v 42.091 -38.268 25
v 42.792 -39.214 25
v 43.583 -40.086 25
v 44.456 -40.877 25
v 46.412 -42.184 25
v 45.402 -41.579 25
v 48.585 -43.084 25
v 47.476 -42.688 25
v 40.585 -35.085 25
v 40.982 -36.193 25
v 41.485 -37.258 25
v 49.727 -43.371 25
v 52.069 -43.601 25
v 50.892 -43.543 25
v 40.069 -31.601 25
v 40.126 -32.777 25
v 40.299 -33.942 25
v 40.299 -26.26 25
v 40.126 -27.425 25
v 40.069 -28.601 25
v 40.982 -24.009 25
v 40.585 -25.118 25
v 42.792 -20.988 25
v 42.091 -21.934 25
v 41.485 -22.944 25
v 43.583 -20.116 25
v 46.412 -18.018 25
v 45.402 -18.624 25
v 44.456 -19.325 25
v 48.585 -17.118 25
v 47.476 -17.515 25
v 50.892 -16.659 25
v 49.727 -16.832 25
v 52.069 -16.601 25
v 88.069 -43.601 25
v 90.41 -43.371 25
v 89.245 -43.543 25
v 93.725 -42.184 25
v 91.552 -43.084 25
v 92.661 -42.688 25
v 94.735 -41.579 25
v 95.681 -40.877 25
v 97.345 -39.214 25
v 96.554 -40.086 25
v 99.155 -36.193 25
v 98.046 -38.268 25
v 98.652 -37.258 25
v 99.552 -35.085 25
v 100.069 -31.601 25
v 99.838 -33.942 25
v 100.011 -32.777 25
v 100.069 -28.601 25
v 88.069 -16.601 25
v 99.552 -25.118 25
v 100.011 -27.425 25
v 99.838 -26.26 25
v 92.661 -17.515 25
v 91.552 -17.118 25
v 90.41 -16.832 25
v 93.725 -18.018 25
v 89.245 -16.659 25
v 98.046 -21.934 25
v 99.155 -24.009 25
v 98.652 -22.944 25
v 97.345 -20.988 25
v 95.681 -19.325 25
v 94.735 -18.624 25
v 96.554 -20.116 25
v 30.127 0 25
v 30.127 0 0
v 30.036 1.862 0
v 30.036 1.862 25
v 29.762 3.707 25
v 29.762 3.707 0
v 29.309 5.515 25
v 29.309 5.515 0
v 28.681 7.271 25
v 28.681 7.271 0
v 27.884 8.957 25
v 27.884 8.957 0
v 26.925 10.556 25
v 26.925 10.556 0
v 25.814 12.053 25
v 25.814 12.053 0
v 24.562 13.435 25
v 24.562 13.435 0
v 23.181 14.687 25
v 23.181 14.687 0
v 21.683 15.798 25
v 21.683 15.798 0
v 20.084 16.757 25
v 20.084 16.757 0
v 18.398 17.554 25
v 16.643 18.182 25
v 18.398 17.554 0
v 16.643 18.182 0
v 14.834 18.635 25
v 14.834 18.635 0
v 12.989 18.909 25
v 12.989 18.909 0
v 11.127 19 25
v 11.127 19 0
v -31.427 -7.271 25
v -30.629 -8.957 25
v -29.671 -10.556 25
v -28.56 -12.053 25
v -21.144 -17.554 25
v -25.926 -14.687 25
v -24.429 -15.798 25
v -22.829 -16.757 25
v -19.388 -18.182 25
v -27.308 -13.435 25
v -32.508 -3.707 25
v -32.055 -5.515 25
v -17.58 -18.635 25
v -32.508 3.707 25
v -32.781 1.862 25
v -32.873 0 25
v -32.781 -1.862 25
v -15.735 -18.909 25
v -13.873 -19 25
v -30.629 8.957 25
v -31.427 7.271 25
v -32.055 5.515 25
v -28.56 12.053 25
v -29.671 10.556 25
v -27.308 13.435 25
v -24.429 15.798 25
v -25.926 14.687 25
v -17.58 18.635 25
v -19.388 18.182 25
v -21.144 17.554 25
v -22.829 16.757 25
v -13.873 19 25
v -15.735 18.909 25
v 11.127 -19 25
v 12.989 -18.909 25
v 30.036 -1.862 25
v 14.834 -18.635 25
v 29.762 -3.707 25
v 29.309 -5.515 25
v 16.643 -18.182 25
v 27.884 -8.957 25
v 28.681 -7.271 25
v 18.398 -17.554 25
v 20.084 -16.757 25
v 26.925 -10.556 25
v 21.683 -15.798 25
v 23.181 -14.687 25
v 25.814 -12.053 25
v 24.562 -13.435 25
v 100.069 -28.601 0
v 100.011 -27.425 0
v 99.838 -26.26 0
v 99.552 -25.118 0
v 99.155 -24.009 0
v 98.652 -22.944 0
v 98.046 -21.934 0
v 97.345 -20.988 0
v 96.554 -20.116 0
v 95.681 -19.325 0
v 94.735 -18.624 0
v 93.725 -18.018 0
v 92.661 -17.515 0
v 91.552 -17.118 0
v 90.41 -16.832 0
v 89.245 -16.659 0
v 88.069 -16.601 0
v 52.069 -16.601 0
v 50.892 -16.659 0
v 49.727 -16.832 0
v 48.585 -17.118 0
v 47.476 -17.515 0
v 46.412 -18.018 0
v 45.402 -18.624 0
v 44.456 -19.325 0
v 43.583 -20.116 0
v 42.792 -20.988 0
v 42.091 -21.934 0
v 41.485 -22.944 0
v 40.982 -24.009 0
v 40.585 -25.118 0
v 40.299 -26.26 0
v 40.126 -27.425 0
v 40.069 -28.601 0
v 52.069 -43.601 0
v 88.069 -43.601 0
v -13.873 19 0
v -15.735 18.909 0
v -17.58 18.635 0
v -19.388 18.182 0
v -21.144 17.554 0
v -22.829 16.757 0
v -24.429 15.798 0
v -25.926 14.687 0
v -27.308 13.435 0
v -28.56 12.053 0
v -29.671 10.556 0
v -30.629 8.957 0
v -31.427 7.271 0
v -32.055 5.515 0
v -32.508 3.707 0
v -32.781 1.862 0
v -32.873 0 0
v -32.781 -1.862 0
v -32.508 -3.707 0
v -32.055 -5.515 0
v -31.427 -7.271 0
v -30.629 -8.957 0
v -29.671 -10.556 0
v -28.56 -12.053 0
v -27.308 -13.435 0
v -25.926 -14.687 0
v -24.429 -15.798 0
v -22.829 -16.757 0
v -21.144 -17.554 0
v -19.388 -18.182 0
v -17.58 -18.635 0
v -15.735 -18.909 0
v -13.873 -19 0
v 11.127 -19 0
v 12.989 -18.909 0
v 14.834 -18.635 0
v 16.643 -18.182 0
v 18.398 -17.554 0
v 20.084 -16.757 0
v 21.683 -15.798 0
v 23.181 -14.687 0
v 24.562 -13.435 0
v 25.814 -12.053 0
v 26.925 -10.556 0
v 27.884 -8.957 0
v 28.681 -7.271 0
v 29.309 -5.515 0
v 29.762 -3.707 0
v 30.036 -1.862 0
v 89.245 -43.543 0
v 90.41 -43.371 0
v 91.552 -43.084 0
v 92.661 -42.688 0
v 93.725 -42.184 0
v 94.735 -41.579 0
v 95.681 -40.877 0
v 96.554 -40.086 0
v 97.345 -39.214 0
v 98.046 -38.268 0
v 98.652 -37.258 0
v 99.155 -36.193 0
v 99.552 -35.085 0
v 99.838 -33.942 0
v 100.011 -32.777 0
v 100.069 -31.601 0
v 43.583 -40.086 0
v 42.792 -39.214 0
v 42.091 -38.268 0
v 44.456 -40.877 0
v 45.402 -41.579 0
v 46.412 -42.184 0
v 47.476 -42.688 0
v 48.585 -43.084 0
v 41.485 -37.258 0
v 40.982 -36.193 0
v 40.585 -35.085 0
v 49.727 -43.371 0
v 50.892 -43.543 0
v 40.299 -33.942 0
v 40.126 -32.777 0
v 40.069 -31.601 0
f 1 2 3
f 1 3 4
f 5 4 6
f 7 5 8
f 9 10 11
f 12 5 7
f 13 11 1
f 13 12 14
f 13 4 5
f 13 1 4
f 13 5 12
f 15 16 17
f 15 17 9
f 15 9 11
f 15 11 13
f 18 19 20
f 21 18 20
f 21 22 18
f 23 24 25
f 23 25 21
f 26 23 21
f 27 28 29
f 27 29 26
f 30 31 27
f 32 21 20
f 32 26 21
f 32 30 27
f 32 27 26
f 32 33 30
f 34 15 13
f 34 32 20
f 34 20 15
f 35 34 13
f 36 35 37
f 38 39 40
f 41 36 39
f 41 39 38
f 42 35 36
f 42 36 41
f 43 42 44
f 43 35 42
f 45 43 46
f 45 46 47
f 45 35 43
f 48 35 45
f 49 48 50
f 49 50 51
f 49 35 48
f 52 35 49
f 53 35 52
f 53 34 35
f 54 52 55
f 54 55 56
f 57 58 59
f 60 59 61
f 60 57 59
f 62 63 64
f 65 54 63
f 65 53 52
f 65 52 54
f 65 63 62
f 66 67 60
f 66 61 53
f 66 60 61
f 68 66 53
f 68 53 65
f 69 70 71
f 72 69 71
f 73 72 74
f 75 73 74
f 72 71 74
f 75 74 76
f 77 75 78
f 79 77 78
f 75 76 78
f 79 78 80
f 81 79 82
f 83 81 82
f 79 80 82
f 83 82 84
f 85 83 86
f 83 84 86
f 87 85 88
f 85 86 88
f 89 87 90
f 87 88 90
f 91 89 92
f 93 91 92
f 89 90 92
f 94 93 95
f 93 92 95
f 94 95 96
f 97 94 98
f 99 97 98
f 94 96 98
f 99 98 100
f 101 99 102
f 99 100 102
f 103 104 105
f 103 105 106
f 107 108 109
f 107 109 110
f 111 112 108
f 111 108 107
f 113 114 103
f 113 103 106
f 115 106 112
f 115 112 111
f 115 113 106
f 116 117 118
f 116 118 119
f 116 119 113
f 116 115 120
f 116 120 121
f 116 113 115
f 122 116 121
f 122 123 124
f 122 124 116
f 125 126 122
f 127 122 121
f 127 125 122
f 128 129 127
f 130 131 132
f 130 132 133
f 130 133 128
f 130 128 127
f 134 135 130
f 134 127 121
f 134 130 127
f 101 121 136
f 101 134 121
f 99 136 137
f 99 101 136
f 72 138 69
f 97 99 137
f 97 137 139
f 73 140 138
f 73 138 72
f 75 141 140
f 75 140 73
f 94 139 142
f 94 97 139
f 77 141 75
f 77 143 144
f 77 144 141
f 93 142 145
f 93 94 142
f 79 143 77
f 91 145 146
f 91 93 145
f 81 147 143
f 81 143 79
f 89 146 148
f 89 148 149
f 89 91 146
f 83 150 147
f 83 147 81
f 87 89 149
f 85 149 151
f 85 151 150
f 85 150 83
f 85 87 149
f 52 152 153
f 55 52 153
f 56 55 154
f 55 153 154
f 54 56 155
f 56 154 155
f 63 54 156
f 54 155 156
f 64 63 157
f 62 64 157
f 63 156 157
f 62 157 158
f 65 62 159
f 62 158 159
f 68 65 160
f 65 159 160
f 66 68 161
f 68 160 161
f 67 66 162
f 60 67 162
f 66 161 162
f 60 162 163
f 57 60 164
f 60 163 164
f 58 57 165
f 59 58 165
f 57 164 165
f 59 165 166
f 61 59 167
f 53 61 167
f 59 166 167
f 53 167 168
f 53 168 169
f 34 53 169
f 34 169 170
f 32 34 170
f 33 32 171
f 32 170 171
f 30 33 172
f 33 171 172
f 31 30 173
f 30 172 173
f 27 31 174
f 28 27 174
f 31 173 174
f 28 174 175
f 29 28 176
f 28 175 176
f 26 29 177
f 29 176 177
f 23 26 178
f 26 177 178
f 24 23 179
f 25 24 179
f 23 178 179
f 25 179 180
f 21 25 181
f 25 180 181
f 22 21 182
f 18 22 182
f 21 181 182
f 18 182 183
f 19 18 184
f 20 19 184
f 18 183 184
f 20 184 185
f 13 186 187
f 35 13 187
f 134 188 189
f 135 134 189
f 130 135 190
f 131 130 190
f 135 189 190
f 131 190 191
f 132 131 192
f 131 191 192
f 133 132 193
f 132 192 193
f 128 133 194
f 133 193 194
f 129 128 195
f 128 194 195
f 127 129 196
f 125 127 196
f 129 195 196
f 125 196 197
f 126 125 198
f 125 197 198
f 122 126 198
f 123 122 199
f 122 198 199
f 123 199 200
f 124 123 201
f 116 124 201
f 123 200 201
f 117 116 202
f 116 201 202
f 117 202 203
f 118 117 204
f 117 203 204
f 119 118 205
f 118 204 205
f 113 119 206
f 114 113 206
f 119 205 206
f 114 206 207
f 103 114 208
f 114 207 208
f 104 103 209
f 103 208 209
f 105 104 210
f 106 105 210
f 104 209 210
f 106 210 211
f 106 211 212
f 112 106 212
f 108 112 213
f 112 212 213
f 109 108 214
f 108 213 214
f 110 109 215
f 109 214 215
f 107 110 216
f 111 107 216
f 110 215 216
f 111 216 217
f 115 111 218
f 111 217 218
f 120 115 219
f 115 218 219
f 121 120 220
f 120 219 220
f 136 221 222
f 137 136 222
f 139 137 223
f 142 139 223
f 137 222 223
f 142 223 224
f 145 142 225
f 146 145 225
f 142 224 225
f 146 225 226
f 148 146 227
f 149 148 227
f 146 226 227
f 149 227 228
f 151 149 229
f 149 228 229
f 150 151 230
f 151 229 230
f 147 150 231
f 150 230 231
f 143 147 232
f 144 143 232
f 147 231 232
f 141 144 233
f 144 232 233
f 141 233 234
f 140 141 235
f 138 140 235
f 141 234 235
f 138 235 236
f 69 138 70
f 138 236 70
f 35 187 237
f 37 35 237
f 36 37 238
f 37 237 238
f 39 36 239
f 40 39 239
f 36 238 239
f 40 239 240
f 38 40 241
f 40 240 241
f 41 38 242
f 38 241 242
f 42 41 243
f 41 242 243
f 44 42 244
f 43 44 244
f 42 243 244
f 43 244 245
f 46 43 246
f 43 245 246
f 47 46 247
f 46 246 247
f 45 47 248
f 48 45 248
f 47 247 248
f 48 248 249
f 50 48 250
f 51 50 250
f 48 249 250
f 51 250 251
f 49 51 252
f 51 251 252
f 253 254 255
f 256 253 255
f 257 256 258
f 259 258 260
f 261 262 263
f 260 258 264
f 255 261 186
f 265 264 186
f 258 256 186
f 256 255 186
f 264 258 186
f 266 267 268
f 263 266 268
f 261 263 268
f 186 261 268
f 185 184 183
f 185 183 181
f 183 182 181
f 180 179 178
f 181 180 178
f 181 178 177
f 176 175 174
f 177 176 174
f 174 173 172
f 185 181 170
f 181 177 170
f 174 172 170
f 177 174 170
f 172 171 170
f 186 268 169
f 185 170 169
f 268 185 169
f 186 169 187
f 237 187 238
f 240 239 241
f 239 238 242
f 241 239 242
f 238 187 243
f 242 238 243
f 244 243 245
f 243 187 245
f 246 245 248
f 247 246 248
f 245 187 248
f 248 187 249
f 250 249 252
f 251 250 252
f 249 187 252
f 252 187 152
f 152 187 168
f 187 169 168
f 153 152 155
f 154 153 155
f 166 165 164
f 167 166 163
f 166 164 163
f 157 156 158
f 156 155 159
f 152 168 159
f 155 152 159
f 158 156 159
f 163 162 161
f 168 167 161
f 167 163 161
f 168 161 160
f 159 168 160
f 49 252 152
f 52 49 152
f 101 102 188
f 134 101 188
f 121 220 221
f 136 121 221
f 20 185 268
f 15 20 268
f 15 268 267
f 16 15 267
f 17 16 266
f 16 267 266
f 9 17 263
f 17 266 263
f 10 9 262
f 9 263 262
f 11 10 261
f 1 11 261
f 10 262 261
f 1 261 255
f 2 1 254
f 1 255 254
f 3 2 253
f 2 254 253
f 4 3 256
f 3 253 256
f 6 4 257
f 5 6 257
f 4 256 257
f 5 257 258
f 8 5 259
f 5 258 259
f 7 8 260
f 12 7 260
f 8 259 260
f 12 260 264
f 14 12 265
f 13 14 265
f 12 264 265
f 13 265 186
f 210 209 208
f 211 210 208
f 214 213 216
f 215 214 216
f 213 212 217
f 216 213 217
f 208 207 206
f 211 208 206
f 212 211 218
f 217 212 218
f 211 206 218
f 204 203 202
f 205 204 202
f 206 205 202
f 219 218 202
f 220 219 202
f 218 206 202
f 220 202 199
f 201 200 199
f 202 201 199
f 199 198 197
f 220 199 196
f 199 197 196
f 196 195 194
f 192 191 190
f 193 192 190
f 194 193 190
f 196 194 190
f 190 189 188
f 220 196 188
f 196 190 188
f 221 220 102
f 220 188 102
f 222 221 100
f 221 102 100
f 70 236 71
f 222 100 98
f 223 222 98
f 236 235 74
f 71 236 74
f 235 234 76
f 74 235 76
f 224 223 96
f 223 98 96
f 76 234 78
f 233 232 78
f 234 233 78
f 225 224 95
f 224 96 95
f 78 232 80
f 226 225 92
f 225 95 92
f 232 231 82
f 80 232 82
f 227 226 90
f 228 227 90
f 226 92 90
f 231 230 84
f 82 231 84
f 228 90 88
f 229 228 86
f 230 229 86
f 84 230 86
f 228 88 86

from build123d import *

# Parameters (mm, degrees)
F1_DEPTH = 25
F3_DEPTH = 25


with BuildPart() as f1:
    # F0 (on Top) → F1 (new body)
    with BuildSketch(Plane.XY):
        with BuildLine():
            ThreePointArc((-1.3728568151, 14.3090880213), (-7.1972546851, 17.7886575154), (-13.8728568151, 19))
            ThreePointArc((-13.8728568151, 19), (-32.8728568151, 0), (-13.8728568151, -19))
            ThreePointArc((-13.8728568151, -19), (-7.1972546851, -17.7886575154), (-1.3728568151, -14.3090880213))
            ThreePointArc((-1.3728568151, -14.3090880213), (-7.8728568151, 0), (-1.3728568151, 14.3090880213))
        make_face()
        with BuildLine():
            Line((11.1271431849, 19), (-13.8728568151, 19))
            ThreePointArc((-13.8728568151, 19), (-7.1972546851, 17.7886575154), (-1.3728568151, 14.3090880213))
            ThreePointArc((-1.3728568151, 14.3090880213), (4.4515410549, 17.7886575154), (11.1271431849, 19))
        make_face()
        with BuildLine():
            ThreePointArc((-1.3728568151, -14.3090880213), (-7.1972546851, -17.7886575154), (-13.8728568151, -19))
            Line((-13.8728568151, -19), (11.1271431849, -19))
            ThreePointArc((11.1271431849, -19), (4.4515410549, -17.7886575154), (-1.3728568151, -14.3090880213))
        make_face()
        with BuildLine():
            ThreePointArc((11.1271431849, 19), (4.4515410549, 17.7886575154), (-1.3728568151, 14.3090880213))
            ThreePointArc((-1.3728568151, 14.3090880213), (3.4259870769, 7.8581168228), (5.1271431849, 0))
            ThreePointArc((5.1271431849, 0), (3.4259870769, -7.8581168228), (-1.3728568151, -14.3090880213))
            ThreePointArc((-1.3728568151, -14.3090880213), (4.4515410549, -17.7886575154), (11.1271431849, -19))
            ThreePointArc((11.1271431849, -19), (24.5621720274, -13.4350288425), (30.1271431849, 0))
            ThreePointArc((30.1271431849, 0), (24.5621720274, 13.4350288425), (11.1271431849, 19))
        make_face()
        with BuildLine():
            ThreePointArc((5.1271431849, 0), (3.4259870769, 7.8581168228), (-1.3728568151, 14.3090880213))
            ThreePointArc((-1.3728568151, 14.3090880213), (-7.8728568151, 0), (-1.3728568151, -14.3090880213))
            ThreePointArc((-1.3728568151, -14.3090880213), (3.4259870769, -7.8581168228), (5.1271431849, 0))
        make_face()
    extrude(amount=F1_DEPTH)


with BuildPart() as f3:
    # F2 (on Top) → F3 (new body)
    with BuildSketch(Plane.XY):
        with BuildLine():
            ThreePointArc((40.1626702507, -30.1011827665), (40.0921040397, -30.849707816), (40.0685511505, -31.6011827665))
            ThreePointArc((40.0685511505, -31.6011827665), (43.5832697763, -40.0864641407), (52.0685511505, -43.6011827665))
            ThreePointArc((52.0685511505, -43.6011827665), (60.5538325247, -40.0864641407), (64.0685511505, -31.6011827665))
            ThreePointArc((64.0685511505, -31.6011827665), (64.0449982613, -30.849707816), (63.9744320503, -30.1011827665))
            ThreePointArc((63.9744320503, -30.1011827665), (52.0685511505, -40.6011827665), (40.1626702507, -30.1011827665))
        make_face()
        with BuildLine():
            Line((40.0685511505, -28.6011827665), (40.0685511505, -31.6011827665))
            ThreePointArc((40.0685511505, -31.6011827665), (40.0921040397, -30.849707816), (40.1626702507, -30.1011827665))
            ThreePointArc((40.1626702507, -30.1011827665), (40.0921040397, -29.352657717), (40.0685511505, -28.6011827665))
        make_face()
        with BuildLine():
            ThreePointArc((64.0685511505, -31.6011827665), (60.5538325247, -40.0864641407), (52.0685511505, -43.6011827665))
            Line((52.0685511505, -43.6011827665), (88.0685511505, -43.6011827665))
            ThreePointArc((88.0685511505, -43.6011827665), (79.0685511505, -39.5384366997), (76.1626702507, -30.1011827665))
            ThreePointArc((76.1626702507, -30.1011827665), (79.0685511505, -20.6639288333), (88.0685511505, -16.6011827665))
            Line((88.0685511505, -16.6011827665), (52.0685511505, -16.6011827665))
            ThreePointArc((52.0685511505, -16.6011827665), (60.5538325247, -20.1159013923), (64.0685511505, -28.6011827665))
            ThreePointArc((64.0685511505, -28.6011827665), (64.0449982613, -29.352657717), (63.9744320503, -30.1011827665))
            ThreePointArc((63.9744320503, -30.1011827665), (64.0449982613, -30.849707816), (64.0685511505, -31.6011827665))
        make_face()
        with BuildLine():
            ThreePointArc((40.0685511505, -28.6011827665), (40.0921040397, -29.352657717), (40.1626702507, -30.1011827665))
            ThreePointArc((40.1626702507, -30.1011827665), (52.0685511505, -19.6011827665), (63.9744320503, -30.1011827665))
            ThreePointArc((63.9744320503, -30.1011827665), (64.0449982613, -29.352657717), (64.0685511505, -28.6011827665))
            ThreePointArc((64.0685511505, -28.6011827665), (60.5538325247, -20.1159013923), (52.0685511505, -16.6011827665))
            ThreePointArc((52.0685511505, -16.6011827665), (43.5832697763, -20.1159013923), (40.0685511505, -28.6011827665))
        make_face()
        with BuildLine():
            ThreePointArc((63.9744320503, -30.1011827665), (52.0685511505, -19.6011827665), (40.1626702507, -30.1011827665))
            ThreePointArc((40.1626702507, -30.1011827665), (52.0685511505, -40.6011827665), (63.9744320503, -30.1011827665))
        make_face()
        with BuildLine():
            ThreePointArc((76.1626702507, -30.1011827665), (79.0685511505, -39.5384366997), (88.0685511505, -43.6011827665))
            ThreePointArc((88.0685511505, -43.6011827665), (96.5538325247, -40.0864641407), (100.0685511505, -31.6011827665))
            ThreePointArc((100.0685511505, -31.6011827665), (100.0449982613, -30.849707816), (99.9744320503, -30.1011827665))
            ThreePointArc((99.9744320503, -30.1011827665), (88.0685511505, -40.6011827665), (76.1626702507, -30.1011827665))
        make_face()
        with BuildLine():
            ThreePointArc((99.9744320503, -30.1011827665), (100.0449982613, -30.849707816), (100.0685511505, -31.6011827665))
            Line((100.0685511505, -31.6011827665), (100.0685511505, -28.6011827665))
            ThreePointArc((100.0685511505, -28.6011827665), (100.0449982613, -29.352657717), (99.9744320503, -30.1011827665))
        make_face()
        with BuildLine():
            ThreePointArc((99.9744320503, -30.1011827665), (88.0685511505, -19.6011827665), (76.1626702507, -30.1011827665))
            ThreePointArc((76.1626702507, -30.1011827665), (88.0685511505, -40.6011827665), (99.9744320503, -30.1011827665))
        make_face()
        with BuildLine():
            ThreePointArc((88.0685511505, -16.6011827665), (79.0685511505, -20.6639288333), (76.1626702507, -30.1011827665))
            ThreePointArc((76.1626702507, -30.1011827665), (88.0685511505, -19.6011827665), (99.9744320503, -30.1011827665))
            ThreePointArc((99.9744320503, -30.1011827665), (100.0449982613, -29.352657717), (100.0685511505, -28.6011827665))
            ThreePointArc((100.0685511505, -28.6011827665), (96.5538325247, -20.1159013923), (88.0685511505, -16.6011827665))
        make_face()
    extrude(amount=F3_DEPTH)


solid = Compound([f1.part, f3.part])
